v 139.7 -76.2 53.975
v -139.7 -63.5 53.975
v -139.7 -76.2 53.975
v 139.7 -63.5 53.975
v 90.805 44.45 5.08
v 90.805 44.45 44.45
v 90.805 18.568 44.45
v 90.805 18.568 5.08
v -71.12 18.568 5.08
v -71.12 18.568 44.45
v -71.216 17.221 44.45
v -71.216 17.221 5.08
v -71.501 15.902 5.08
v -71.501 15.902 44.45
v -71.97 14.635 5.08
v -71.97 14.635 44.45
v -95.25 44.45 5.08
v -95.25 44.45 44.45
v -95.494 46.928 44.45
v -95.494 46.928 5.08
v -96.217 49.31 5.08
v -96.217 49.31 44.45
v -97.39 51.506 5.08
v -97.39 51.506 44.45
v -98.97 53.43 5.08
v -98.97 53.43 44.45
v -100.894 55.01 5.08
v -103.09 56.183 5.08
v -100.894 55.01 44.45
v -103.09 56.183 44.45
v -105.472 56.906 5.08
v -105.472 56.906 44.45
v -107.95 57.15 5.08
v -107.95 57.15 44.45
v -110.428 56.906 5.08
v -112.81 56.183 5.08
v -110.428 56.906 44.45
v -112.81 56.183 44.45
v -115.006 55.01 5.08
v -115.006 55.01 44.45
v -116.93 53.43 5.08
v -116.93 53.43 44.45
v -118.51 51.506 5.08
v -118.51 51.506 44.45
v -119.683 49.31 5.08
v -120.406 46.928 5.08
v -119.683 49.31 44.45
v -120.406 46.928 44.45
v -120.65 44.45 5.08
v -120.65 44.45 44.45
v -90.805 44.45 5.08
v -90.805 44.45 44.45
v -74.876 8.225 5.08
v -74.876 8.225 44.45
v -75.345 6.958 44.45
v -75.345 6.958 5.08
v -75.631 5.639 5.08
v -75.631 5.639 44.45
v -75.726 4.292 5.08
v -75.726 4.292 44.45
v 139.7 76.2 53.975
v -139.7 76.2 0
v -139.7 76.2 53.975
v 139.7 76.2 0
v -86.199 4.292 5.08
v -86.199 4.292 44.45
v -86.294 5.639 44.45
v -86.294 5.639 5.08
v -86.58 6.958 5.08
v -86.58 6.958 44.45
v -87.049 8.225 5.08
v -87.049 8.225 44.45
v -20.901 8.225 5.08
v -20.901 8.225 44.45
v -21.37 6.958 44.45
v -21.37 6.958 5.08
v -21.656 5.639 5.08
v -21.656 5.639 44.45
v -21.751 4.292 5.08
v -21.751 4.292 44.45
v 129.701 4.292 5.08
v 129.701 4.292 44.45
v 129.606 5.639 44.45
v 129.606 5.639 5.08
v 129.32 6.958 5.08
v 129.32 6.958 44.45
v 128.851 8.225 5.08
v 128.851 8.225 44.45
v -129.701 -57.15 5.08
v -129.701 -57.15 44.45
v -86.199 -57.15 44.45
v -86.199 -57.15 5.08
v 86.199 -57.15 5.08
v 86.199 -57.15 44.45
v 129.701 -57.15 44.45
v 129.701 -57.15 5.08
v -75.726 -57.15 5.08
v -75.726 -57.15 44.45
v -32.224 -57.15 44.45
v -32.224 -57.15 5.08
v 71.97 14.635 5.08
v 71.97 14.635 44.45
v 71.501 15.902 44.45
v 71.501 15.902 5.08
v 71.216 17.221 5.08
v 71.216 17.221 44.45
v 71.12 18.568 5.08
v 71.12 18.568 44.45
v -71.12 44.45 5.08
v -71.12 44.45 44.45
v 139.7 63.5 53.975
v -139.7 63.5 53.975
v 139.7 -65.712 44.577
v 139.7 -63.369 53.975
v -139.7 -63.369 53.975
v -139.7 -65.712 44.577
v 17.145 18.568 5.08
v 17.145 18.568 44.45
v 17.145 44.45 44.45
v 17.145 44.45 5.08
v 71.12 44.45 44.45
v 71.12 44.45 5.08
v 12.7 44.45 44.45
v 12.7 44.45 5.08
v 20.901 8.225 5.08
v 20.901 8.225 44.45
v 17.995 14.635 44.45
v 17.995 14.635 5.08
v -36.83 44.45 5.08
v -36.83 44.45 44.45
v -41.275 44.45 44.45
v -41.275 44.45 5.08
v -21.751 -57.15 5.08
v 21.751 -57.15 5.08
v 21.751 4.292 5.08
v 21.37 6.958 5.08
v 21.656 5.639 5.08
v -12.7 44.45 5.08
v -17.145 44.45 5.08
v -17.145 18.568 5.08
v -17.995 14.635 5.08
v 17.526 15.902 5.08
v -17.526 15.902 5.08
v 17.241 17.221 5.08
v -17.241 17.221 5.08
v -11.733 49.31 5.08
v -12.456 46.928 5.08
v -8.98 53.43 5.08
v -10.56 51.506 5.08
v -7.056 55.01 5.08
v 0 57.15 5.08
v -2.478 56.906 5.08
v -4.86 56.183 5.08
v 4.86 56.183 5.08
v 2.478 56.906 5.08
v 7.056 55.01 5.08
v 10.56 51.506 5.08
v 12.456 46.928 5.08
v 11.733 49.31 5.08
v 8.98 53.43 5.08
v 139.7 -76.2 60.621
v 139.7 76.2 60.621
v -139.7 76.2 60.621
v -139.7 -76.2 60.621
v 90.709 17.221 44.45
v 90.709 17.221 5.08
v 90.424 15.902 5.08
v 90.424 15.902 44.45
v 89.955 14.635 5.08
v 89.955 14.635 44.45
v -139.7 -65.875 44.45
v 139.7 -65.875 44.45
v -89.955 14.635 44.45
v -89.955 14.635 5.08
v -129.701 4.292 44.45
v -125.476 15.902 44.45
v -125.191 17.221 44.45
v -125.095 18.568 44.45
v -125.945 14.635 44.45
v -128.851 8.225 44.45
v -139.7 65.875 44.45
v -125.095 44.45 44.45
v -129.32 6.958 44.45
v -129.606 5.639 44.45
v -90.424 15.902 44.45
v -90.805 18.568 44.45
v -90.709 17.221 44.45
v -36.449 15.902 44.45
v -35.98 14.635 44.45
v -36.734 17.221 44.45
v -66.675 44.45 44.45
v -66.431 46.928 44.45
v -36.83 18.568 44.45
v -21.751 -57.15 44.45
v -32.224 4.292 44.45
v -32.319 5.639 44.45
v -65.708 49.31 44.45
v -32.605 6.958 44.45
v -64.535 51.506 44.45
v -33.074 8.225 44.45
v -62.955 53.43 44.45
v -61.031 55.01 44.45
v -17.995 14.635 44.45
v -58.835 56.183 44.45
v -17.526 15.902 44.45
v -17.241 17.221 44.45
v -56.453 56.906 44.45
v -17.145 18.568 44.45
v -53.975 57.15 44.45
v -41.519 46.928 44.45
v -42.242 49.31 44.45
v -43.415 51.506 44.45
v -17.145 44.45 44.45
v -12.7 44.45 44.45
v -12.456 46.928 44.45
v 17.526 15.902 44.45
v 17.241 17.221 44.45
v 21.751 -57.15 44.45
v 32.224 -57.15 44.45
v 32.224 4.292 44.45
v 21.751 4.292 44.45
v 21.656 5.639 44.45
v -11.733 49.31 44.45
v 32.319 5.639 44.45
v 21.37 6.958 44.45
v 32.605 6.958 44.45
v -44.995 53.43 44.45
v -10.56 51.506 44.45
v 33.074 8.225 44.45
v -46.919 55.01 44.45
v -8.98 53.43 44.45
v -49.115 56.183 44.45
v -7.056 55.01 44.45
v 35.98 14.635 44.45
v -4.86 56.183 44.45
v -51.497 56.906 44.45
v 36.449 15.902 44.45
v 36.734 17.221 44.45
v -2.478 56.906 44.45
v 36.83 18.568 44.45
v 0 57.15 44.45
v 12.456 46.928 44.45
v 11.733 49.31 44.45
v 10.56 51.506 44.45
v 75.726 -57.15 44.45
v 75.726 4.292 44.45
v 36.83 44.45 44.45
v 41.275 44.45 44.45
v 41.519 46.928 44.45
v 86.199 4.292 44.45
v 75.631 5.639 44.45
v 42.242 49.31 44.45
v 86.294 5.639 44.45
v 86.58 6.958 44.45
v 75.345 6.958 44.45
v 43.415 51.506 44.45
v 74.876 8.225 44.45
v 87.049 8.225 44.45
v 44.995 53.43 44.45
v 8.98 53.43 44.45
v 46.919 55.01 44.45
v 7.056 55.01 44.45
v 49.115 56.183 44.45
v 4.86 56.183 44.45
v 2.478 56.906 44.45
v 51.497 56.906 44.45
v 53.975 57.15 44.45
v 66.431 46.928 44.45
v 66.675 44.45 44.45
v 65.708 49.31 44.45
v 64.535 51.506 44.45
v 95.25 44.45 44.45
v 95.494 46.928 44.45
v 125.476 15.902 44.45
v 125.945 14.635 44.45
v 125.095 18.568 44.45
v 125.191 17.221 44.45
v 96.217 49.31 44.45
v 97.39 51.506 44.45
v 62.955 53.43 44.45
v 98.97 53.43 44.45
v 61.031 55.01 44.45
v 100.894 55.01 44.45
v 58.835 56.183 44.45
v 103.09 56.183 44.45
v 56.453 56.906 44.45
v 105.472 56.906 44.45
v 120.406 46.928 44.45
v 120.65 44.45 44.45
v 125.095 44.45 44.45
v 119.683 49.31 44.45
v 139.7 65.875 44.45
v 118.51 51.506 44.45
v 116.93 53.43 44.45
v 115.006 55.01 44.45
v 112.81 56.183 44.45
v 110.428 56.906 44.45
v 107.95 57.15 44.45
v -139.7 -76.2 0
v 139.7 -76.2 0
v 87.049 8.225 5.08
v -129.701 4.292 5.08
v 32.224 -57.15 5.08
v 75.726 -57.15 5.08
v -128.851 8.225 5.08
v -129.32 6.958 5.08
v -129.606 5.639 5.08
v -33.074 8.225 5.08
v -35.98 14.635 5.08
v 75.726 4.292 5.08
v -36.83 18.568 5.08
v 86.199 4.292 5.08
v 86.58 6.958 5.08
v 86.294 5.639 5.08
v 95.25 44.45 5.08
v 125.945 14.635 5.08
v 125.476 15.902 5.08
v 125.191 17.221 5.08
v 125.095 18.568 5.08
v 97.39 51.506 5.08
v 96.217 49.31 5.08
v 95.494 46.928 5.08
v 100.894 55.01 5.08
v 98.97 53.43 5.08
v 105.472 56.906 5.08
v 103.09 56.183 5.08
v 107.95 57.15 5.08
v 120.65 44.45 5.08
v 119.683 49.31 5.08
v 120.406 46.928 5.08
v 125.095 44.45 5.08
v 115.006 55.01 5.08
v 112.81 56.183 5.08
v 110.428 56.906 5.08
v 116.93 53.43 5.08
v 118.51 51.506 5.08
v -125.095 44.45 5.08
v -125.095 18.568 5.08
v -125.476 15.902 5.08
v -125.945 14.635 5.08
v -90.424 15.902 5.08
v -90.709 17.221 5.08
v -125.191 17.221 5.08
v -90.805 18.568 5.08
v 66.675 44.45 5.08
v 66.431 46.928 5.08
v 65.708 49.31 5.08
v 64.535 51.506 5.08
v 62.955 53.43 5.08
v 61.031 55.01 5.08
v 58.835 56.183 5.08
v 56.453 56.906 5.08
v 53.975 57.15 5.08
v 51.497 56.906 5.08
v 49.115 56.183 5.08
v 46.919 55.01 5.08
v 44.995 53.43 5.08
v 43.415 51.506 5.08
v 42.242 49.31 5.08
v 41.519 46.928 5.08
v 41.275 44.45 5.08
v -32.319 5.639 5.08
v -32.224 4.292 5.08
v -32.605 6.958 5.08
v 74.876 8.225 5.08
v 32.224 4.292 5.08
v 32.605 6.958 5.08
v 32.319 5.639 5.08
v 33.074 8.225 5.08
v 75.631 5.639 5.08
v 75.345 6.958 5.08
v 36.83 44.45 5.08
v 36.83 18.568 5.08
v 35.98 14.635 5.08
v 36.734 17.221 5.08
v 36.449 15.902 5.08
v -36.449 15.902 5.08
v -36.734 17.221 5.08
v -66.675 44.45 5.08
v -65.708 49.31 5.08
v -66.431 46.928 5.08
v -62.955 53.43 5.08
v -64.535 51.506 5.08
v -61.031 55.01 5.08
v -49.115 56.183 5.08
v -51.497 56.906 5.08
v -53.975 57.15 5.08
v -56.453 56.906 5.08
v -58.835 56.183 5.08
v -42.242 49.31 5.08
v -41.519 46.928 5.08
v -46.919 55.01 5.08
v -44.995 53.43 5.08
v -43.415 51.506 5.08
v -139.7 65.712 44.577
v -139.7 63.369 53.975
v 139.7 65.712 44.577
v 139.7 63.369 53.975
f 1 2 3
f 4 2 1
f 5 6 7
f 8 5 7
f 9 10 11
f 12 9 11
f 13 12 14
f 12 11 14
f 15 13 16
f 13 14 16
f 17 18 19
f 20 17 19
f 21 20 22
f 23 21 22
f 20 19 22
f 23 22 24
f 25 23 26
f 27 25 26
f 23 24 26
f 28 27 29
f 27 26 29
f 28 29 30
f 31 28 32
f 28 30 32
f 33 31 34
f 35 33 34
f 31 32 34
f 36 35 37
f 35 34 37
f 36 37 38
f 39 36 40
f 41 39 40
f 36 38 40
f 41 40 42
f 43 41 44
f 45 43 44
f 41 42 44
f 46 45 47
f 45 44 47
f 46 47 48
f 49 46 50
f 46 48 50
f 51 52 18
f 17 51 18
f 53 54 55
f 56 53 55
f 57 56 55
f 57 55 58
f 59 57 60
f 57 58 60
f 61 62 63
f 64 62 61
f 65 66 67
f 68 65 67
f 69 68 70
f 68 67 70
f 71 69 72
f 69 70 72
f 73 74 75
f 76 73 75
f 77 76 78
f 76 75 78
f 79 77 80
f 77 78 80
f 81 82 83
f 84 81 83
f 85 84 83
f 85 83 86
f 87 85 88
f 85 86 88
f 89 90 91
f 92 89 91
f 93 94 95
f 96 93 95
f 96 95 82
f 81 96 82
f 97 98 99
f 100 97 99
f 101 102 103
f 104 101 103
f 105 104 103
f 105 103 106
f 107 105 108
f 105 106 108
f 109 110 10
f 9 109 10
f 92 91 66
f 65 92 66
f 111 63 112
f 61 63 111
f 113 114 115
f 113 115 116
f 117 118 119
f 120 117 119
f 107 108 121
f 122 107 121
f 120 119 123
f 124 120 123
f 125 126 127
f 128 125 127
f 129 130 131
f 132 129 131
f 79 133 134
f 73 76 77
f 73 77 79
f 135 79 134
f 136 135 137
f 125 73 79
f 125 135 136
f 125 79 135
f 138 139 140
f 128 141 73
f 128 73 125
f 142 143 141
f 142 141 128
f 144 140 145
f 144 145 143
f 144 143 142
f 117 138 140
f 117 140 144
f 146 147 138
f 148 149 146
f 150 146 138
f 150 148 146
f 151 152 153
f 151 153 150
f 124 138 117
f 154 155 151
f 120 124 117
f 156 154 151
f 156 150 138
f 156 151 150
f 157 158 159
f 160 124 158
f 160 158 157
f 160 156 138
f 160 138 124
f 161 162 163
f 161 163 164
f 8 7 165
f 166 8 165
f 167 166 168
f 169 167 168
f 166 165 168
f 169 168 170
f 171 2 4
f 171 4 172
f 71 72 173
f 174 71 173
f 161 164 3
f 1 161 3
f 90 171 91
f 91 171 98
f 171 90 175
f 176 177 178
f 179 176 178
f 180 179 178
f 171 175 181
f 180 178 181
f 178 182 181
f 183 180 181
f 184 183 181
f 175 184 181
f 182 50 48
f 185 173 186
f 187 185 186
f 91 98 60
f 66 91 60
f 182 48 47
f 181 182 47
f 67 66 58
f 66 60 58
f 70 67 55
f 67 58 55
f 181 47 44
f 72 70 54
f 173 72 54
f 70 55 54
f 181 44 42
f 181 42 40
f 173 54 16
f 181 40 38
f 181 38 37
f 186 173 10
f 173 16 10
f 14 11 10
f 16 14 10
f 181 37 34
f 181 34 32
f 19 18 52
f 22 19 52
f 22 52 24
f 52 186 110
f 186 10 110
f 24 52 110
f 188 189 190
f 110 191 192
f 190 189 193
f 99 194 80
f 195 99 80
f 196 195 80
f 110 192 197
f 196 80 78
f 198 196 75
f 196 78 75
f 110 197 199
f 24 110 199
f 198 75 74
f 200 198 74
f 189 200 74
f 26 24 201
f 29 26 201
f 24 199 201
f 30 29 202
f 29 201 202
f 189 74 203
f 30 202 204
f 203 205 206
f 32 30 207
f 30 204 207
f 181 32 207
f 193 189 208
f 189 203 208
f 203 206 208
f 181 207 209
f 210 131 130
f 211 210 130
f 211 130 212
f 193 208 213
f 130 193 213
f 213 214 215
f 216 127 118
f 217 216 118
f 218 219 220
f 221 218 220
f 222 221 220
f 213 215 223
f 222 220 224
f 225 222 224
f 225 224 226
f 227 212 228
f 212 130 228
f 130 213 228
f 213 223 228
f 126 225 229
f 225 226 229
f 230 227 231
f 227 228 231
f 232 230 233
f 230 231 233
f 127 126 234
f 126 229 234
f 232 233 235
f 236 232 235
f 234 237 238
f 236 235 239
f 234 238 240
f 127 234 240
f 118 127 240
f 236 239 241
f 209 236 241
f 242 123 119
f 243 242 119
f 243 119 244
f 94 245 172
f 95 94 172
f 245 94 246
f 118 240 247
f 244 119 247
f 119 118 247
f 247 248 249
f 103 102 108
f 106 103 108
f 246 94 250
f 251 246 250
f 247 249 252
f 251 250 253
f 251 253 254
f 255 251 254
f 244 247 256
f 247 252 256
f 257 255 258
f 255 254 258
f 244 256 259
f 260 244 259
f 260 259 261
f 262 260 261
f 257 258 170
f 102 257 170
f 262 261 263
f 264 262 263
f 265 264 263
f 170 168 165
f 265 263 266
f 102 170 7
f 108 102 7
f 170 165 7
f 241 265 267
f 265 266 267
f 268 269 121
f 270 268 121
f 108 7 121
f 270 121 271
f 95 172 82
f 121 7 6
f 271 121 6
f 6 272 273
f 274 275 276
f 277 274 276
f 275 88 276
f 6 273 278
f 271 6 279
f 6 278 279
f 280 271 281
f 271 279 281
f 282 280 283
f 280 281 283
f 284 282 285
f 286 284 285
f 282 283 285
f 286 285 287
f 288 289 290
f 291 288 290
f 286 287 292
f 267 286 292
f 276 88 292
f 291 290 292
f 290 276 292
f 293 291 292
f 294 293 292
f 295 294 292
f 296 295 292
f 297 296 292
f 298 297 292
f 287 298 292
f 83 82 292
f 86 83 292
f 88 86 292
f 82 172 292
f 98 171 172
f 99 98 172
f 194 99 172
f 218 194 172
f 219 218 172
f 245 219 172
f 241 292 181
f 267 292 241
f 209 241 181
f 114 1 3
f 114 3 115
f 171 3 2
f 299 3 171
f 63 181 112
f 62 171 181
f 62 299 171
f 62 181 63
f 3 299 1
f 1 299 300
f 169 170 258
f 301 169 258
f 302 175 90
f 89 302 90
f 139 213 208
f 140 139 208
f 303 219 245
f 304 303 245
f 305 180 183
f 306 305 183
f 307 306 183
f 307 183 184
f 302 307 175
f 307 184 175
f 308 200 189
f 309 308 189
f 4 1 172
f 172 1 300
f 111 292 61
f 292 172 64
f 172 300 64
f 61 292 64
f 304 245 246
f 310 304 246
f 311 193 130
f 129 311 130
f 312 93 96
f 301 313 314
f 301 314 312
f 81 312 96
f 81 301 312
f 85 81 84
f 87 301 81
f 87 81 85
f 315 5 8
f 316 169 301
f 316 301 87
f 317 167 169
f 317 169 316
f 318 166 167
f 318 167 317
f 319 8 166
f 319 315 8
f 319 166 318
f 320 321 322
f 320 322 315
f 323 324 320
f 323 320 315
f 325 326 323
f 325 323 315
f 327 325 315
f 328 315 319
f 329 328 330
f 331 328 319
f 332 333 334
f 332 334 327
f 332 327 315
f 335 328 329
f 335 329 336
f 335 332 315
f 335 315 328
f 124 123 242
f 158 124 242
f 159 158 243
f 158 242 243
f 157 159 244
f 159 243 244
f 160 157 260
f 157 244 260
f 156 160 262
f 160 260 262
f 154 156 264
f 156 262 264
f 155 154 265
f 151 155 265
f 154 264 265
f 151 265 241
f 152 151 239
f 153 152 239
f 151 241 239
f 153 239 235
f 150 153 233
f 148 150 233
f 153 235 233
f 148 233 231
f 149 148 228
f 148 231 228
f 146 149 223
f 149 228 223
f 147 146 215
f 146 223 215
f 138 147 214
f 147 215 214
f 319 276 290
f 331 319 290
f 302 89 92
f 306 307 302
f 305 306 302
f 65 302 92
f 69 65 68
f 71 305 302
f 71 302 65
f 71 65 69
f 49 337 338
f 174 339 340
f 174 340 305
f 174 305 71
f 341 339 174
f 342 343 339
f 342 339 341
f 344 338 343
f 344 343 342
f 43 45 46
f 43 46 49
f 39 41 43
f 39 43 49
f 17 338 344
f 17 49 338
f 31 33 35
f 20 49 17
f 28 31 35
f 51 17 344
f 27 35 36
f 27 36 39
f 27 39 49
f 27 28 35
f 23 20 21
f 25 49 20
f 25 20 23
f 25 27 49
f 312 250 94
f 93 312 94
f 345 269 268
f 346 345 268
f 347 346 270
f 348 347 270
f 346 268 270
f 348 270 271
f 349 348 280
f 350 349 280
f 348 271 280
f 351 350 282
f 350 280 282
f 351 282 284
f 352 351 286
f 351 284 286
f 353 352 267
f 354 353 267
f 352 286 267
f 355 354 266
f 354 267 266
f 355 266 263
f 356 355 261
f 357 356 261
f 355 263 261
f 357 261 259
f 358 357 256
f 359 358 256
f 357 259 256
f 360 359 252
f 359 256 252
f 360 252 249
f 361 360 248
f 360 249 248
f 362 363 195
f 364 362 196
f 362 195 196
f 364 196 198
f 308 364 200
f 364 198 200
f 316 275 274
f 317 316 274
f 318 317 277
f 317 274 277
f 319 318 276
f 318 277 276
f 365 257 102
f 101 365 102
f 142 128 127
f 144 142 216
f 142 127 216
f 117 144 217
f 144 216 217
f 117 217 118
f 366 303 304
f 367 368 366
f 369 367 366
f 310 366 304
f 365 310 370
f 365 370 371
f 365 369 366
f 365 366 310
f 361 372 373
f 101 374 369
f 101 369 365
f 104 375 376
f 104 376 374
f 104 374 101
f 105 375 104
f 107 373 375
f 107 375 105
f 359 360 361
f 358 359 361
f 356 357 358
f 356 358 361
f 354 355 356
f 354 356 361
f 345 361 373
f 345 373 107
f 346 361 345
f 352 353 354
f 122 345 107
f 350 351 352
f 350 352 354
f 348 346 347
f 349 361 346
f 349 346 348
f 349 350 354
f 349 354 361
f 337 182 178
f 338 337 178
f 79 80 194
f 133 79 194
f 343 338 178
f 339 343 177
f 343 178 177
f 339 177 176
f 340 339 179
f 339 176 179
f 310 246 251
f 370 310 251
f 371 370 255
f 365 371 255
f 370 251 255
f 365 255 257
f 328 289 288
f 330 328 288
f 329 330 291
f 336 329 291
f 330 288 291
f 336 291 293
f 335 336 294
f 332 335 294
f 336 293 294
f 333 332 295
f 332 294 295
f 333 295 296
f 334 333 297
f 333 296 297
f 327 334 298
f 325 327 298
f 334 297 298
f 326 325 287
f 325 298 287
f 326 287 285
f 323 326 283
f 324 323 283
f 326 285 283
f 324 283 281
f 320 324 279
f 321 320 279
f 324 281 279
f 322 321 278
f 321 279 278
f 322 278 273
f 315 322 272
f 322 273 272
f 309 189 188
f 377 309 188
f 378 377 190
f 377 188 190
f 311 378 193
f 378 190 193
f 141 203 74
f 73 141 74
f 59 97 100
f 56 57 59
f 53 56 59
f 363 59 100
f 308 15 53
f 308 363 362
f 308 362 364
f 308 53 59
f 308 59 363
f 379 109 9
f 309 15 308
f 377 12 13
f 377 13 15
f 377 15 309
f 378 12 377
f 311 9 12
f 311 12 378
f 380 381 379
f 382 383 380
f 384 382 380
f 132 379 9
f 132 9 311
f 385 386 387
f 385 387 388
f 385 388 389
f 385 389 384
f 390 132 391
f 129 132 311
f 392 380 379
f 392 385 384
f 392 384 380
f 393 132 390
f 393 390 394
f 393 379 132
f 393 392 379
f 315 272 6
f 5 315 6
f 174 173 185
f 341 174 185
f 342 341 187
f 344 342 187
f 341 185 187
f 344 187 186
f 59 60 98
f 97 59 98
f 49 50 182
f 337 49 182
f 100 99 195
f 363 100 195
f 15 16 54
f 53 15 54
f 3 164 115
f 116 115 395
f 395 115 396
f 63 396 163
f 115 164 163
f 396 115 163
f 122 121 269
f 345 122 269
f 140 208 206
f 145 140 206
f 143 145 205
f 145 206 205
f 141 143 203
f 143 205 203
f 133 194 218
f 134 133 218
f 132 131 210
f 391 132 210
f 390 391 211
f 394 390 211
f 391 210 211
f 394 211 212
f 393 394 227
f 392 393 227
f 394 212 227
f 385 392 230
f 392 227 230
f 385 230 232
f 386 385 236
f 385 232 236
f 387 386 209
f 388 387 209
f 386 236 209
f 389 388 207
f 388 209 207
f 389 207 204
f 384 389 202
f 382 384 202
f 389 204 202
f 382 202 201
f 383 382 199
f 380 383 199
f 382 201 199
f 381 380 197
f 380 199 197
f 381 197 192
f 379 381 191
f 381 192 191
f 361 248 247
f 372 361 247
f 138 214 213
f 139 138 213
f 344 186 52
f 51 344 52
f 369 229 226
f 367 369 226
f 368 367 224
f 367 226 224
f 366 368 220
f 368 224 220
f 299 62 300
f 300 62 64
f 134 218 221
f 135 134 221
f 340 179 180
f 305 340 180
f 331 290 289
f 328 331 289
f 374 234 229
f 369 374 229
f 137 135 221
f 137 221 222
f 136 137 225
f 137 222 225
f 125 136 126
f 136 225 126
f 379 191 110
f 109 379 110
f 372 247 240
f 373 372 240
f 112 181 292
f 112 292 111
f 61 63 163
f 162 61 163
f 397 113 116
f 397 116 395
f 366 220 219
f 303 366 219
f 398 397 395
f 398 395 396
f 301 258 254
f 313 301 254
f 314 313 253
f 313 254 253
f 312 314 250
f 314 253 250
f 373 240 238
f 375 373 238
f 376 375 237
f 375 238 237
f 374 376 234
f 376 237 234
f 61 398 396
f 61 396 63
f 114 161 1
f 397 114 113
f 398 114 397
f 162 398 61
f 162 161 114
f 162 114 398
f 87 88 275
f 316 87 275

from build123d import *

# Parameters (mm, degrees)
F0_W     = 279.4
F0_H     = 152.4
F1_DEPTH = 53.975
F3_DEPTH = 279.401
F5_DEPTH = 39.37
F7_DEPTH = 279.4


with BuildPart() as f1:
    # F0 (on Top) → F1 (new body)
    with BuildSketch(Plane.XY):
        Rectangle(F0_W, F0_H)
    extrude(amount=F1_DEPTH)

    # F2 (on face) → F3 (cut, through all)
    with BuildSketch(Plane.YZ.offset(139.7)):
        Polygon((-63.5, 53.975), (-65.874849, 44.45), (65.874849, 44.45), (63.5, 53.975), align=None)
    extrude(amount=-F3_DEPTH, mode=Mode.SUBTRACT)

    # F4 (on face) → F5 (cut)
    with BuildSketch(Plane.XY.offset(44.45)):
        with BuildLine():
            Line((-129.701277, -57.15), (-86.198723, -57.15))
            Line((-86.198723, -57.15), (-86.198723, 4.291641))
            ThreePointArc((-86.198723, 4.291641), (-86.413631, 6.303558), (-87.048657, 8.224688))
            Line((-87.048657, 8.224688), (-89.955066, 14.635312))
            ThreePointArc((-89.955066, 14.635312), (-90.590092, 16.556442), (-90.805, 18.568359))
            Line((-90.805, 18.568359), (-90.805, 44.45))
            Line((-90.805, 44.45), (-95.25, 44.45))
            ThreePointArc((-95.25, 44.45), (-107.95, 57.15), (-120.65, 44.45))
            Line((-120.65, 44.45), (-125.095, 44.45))
            Line((-125.095, 44.45), (-125.095, 18.568359))
            ThreePointArc((-125.095, 18.568359), (-125.309908, 16.556442), (-125.944934, 14.635312))
            Line((-125.944934, 14.635312), (-128.851343, 8.224688))
            ThreePointArc((-128.851343, 8.224688), (-129.486369, 6.303558), (-129.701277, 4.291641))
            Line((-129.701277, 4.291641), (-129.701277, -57.15))
        make_face()
        with BuildLine():
            Line((-36.83, 18.568359), (-36.83, 44.45))
            Line((-36.83, 44.45), (-41.275, 44.45))
            ThreePointArc((-41.275, 44.45), (-53.975, 57.15), (-66.675, 44.45))
            Line((-66.675, 44.45), (-71.12, 44.45))
            Line((-71.12, 44.45), (-71.12, 18.568359))
            ThreePointArc((-71.12, 18.568359), (-71.334908, 16.556442), (-71.969934, 14.635312))
            Line((-71.969934, 14.635312), (-74.876343, 8.224688))
            ThreePointArc((-74.876343, 8.224688), (-75.511369, 6.303558), (-75.726277, 4.291641))
            Line((-75.726277, 4.291641), (-75.726277, -57.15))
            Line((-75.726277, -57.15), (-32.223723, -57.15))
            Line((-32.223723, -57.15), (-32.223723, 4.291641))
            ThreePointArc((-32.223723, 4.291641), (-32.438631, 6.303558), (-33.073657, 8.224688))
            Line((-33.073657, 8.224688), (-35.980066, 14.635312))
            ThreePointArc((-35.980066, 14.635312), (-36.615092, 16.556442), (-36.83, 18.568359))
        make_face()
        with BuildLine():
            Line((17.145, 18.568359), (17.145, 44.45))
            Line((17.145, 44.45), (12.7, 44.45))
            ThreePointArc((12.7, 44.45), (0, 57.15), (-12.7, 44.45))
            Line((-12.7, 44.45), (-17.145, 44.45))
            Line((-17.145, 44.45), (-17.145, 18.568359))
            ThreePointArc((-17.145, 18.568359), (-17.359908, 16.556442), (-17.994934, 14.635312))
            Line((-17.994934, 14.635312), (-20.901343, 8.224688))
            ThreePointArc((-20.901343, 8.224688), (-21.536369, 6.303558), (-21.751277, 4.291641))
            Line((-21.751277, 4.291641), (-21.751277, -57.15))
            Line((-21.751277, -57.15), (21.751277, -57.15))
            Line((21.751277, -57.15), (21.751277, 4.291641))
            ThreePointArc((21.751277, 4.291641), (21.536369, 6.303558), (20.901343, 8.224688))
            Line((20.901343, 8.224688), (17.994934, 14.635312))
            ThreePointArc((17.994934, 14.635312), (17.359908, 16.556442), (17.145, 18.568359))
        make_face()
        with BuildLine():
            Line((71.12, 18.568359), (71.12, 44.45))
            Line((71.12, 44.45), (66.675, 44.45))
            ThreePointArc((66.675, 44.45), (53.975, 57.15), (41.275, 44.45))
            Line((41.275, 44.45), (36.83, 44.45))
            Line((36.83, 44.45), (36.83, 18.568359))
            ThreePointArc((36.83, 18.568359), (36.615092, 16.556442), (35.980066, 14.635312))
            Line((35.980066, 14.635312), (33.073657, 8.224688))
            ThreePointArc((33.073657, 8.224688), (32.438631, 6.303558), (32.223723, 4.291641))
            Line((32.223723, 4.291641), (32.223723, -57.15))
            Line((32.223723, -57.15), (75.726277, -57.15))
            Line((75.726277, -57.15), (75.726277, 4.291641))
            ThreePointArc((75.726277, 4.291641), (75.511369, 6.303558), (74.876343, 8.224688))
            Line((74.876343, 8.224688), (71.969934, 14.635312))
            ThreePointArc((71.969934, 14.635312), (71.334908, 16.556442), (71.12, 18.568359))
        make_face()
        with BuildLine():
            Line((125.095, 18.568359), (125.095, 44.45))
            Line((125.095, 44.45), (120.65, 44.45))
            ThreePointArc((120.65, 44.45), (107.95, 57.15), (95.25, 44.45))
            Line((95.25, 44.45), (90.805, 44.45))
            Line((90.805, 44.45), (90.805, 18.568359))
            ThreePointArc((90.805, 18.568359), (90.590092, 16.556442), (89.955066, 14.635312))
            Line((89.955066, 14.635312), (87.048657, 8.224688))
            ThreePointArc((87.048657, 8.224688), (86.413631, 6.303558), (86.198723, 4.291641))
            Line((86.198723, 4.291641), (86.198723, -57.15))
            Line((86.198723, -57.15), (129.701277, -57.15))
            Line((129.701277, -57.15), (129.701277, 4.291641))
            ThreePointArc((129.701277, 4.291641), (129.486369, 6.303558), (128.851343, 8.224688))
            Line((128.851343, 8.224688), (125.944934, 14.635312))
            ThreePointArc((125.944934, 14.635312), (125.309908, 16.556442), (125.095, 18.568359))
        make_face()
    extrude(amount=-F5_DEPTH, mode=Mode.SUBTRACT)


with BuildPart() as f7:
    # F6 (on face) → F7 (new body, through all)
    with BuildSketch(Plane.YZ.offset(139.7)):
        Polygon((-76.2, 60.620756), (-76.2, 53.975), (-63.5, 53.975), (-63.369112, 53.975), (-65.712297, 44.577), (65.712297, 44.577), (63.369112, 53.975), (63.5, 53.975), (76.2, 53.975), (76.2, 60.620756), align=None)
    extrude(amount=-F7_DEPTH)


solid = Compound([f1.part, f7.part])
